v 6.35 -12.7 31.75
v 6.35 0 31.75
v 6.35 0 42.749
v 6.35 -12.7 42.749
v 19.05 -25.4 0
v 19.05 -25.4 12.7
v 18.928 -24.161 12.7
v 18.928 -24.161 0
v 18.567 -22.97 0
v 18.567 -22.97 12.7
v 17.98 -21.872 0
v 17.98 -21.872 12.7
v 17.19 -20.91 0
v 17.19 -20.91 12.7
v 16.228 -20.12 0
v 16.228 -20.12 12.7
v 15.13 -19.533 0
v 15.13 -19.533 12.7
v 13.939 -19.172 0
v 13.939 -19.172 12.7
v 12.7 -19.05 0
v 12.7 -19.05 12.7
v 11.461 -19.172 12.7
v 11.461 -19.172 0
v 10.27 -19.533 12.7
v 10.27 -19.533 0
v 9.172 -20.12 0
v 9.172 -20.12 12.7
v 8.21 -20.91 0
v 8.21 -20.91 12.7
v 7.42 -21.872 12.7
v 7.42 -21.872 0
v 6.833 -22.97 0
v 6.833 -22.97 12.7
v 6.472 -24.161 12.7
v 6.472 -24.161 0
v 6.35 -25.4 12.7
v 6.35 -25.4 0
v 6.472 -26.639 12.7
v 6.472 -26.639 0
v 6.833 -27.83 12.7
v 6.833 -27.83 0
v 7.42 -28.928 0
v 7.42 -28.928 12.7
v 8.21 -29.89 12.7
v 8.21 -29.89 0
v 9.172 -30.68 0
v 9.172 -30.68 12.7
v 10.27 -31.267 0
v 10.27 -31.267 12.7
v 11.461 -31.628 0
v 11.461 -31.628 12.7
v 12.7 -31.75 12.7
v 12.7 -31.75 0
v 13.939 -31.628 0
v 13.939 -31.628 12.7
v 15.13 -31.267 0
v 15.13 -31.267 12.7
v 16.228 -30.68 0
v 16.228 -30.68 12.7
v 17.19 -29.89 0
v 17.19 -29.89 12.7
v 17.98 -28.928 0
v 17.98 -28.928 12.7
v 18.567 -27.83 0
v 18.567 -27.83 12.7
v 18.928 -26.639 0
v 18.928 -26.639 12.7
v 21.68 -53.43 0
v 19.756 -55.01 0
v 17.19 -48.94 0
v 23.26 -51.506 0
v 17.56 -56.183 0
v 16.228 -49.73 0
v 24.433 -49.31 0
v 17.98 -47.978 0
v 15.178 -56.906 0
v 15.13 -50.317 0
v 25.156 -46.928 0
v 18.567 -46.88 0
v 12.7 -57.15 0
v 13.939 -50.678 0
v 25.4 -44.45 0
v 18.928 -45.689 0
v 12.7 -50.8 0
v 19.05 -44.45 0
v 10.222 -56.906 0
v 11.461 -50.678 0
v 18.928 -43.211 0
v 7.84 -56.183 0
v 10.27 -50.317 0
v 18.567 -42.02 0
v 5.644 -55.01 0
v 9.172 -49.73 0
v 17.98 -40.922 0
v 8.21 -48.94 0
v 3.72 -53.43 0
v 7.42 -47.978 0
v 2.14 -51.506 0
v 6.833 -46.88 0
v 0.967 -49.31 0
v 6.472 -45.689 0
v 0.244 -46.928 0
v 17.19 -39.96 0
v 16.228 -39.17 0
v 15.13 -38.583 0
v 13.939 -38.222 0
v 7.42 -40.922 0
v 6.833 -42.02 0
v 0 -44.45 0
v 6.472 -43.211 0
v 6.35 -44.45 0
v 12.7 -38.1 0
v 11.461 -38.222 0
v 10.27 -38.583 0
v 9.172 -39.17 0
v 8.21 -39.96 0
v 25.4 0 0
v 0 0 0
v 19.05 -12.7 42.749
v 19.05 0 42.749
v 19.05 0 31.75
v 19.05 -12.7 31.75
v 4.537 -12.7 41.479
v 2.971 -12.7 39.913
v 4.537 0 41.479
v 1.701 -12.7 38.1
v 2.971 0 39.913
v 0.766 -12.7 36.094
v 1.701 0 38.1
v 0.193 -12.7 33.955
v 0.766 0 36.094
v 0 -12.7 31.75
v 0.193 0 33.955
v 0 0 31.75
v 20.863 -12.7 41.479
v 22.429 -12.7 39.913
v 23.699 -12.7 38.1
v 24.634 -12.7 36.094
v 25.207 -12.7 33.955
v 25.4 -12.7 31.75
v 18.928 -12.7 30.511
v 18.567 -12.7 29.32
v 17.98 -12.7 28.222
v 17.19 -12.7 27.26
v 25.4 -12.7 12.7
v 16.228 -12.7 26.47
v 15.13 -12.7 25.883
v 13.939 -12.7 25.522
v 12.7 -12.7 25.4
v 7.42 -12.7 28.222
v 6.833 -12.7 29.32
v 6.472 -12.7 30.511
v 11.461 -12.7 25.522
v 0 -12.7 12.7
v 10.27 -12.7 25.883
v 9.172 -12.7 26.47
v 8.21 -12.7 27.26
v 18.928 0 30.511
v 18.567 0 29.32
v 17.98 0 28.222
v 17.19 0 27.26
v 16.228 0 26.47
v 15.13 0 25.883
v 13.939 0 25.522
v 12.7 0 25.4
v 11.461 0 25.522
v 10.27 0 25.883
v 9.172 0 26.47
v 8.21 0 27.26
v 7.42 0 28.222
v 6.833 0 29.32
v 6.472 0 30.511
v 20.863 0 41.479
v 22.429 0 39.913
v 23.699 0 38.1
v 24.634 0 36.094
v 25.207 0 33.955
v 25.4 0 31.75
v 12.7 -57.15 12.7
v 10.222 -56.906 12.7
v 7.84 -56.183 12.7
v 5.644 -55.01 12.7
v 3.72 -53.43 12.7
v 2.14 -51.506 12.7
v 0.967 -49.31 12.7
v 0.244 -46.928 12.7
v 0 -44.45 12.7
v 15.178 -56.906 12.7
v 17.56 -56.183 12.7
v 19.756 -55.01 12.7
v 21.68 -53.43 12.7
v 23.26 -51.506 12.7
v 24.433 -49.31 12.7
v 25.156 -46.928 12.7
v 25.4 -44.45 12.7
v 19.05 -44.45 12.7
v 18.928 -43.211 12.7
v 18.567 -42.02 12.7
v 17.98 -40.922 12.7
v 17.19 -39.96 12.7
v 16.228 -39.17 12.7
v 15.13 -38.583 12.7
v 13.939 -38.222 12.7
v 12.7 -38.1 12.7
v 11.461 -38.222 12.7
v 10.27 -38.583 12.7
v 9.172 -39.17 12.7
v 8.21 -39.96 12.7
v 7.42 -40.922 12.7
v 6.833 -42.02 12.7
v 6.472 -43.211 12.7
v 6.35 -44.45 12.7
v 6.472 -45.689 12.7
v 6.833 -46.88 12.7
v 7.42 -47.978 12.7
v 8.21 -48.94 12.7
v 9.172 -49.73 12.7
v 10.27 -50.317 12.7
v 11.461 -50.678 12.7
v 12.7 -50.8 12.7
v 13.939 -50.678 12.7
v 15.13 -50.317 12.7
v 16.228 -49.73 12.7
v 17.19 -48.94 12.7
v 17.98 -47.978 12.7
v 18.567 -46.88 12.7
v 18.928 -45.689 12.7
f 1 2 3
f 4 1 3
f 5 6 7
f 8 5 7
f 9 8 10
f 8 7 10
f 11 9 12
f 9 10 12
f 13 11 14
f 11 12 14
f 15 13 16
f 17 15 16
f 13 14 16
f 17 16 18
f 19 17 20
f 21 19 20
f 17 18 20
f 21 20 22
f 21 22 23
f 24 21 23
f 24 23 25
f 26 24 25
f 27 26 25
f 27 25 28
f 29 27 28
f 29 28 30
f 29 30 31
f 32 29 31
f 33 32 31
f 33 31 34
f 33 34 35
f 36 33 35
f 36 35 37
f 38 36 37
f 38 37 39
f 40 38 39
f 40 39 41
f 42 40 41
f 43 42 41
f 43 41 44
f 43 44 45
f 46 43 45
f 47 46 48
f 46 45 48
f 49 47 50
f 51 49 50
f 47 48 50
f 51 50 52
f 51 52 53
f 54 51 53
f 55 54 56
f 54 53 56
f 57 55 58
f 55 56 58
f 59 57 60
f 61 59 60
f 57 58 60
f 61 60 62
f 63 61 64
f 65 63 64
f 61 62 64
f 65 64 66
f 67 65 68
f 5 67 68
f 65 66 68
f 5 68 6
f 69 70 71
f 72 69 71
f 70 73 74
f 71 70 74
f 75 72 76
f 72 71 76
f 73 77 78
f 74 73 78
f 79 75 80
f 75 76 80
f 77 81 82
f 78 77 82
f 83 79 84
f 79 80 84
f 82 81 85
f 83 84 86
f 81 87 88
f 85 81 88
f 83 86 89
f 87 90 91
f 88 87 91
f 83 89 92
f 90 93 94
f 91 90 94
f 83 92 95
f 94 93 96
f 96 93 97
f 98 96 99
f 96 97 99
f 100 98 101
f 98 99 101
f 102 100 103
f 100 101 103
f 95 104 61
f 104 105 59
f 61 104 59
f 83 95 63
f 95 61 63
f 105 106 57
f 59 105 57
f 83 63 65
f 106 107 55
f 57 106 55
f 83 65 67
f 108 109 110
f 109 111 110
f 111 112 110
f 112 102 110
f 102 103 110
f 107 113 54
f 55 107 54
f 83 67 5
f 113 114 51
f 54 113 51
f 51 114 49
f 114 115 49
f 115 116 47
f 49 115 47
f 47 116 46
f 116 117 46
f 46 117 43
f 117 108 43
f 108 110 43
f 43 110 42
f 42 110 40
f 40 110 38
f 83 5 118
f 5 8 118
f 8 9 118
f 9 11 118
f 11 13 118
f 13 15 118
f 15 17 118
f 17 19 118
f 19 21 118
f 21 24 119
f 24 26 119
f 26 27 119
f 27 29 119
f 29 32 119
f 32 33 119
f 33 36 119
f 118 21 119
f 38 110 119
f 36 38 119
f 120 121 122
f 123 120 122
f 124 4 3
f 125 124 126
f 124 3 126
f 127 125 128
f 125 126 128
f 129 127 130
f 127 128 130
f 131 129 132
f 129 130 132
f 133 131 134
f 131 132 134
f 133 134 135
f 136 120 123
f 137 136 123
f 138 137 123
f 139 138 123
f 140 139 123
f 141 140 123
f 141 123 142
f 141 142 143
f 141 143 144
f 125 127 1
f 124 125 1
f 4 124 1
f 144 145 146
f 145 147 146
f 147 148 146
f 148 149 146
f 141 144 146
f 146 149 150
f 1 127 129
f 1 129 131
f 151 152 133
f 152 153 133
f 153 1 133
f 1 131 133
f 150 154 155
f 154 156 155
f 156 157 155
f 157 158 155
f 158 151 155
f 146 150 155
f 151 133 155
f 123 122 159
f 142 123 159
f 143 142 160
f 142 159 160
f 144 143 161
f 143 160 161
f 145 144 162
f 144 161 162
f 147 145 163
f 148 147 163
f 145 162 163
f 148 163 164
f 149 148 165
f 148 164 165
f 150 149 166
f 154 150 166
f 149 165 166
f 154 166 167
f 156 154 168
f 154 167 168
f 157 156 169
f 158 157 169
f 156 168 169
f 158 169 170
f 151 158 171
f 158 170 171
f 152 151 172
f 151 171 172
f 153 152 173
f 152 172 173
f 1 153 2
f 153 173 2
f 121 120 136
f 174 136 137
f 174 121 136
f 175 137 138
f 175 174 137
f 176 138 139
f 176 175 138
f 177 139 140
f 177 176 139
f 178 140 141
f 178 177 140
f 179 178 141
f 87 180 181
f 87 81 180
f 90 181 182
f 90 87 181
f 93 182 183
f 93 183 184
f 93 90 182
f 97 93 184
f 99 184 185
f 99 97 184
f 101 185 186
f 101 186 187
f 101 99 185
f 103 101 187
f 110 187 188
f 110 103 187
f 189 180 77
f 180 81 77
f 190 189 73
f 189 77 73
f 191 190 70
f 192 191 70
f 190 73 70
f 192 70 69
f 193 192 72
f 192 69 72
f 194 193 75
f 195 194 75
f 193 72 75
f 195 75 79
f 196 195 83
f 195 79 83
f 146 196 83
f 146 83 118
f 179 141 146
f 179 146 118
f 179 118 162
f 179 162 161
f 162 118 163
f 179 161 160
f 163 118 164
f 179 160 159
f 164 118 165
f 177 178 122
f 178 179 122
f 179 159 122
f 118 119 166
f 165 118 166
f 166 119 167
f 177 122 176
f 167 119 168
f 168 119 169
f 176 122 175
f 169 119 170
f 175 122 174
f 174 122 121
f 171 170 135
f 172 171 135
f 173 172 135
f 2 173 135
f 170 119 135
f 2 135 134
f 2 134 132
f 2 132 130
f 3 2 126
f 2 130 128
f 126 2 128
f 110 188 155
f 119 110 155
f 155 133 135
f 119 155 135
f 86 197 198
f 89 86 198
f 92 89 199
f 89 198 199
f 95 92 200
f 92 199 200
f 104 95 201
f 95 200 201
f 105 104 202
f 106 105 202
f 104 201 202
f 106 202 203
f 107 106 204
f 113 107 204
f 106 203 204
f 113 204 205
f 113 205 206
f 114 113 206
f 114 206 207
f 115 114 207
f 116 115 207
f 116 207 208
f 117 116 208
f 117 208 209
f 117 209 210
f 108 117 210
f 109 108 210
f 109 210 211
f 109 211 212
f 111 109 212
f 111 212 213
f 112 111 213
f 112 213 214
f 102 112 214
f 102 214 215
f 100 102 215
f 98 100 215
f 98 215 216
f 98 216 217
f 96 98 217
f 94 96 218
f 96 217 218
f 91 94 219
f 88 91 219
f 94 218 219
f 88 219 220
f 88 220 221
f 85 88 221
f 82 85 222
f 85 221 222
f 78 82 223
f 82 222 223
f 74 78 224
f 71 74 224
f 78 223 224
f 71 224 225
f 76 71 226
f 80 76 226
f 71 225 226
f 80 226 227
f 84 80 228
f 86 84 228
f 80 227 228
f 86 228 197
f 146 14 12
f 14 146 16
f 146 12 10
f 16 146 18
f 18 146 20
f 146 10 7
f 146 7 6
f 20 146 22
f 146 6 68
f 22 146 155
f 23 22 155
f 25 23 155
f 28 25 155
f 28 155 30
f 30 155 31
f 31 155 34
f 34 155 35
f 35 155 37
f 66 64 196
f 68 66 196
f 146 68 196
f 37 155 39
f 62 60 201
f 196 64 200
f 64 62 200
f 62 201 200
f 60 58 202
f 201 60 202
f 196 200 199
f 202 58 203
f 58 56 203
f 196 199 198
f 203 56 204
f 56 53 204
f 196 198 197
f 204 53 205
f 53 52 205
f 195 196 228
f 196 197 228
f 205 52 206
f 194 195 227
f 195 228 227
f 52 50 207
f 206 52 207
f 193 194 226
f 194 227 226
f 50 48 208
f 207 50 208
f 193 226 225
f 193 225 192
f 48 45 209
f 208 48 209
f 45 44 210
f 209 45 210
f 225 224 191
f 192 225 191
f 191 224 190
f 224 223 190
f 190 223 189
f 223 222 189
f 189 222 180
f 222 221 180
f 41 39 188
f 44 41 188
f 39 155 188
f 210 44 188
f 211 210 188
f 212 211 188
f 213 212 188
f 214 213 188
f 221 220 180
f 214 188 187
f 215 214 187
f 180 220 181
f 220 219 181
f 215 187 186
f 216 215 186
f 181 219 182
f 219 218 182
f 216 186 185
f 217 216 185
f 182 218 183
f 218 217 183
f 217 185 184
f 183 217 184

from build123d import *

# Parameters (mm, degrees)
F1_DEPTH    = 25.4
F2_T1_DEPTH = 76.2
F3_R        = 12.69999
F6_DEPTH    = 25.4
F4_R        = 6.35
F7_DEPTH    = 25.4


# Not quite as in the source:
# - a fillet or chamfer that OpenCascade refuses, or shapes differently, is made with other operations: its cross-section is extruded or revolved along the edge and cut away or added
# - a fillet or chamfer is up to 0.001 mm smaller than in the source, because OpenCascade refuses the exact size


with BuildPart() as f1:
    # F0 (on Right) → F1 (new body)
    with BuildSketch(Plane.YZ):
        Polygon((-57.15, 0), (0, 0), (0, 44.45), (-12.7, 44.45), (-12.7, 12.7), (-57.15, 12.7), align=None)
    extrude(amount=F1_DEPTH)

    # F2: fillet of radius 12.7 on 2 edges, made by hand

    # F2_s2 → F2_t1 (cut)
    with BuildSketch(Plane.XZ.offset(-31.75)):
        with BuildLine():
            ThreePointArc((12.7, 44.45), (3.7197438789, 40.7302561211), (0, 31.75))
            Line((0, 31.75), (0, 44.45))
            Line((0, 44.45), (12.7, 44.45))
        make_face()
        with BuildLine():
            ThreePointArc((12.7, 44.45), (21.6802561211, 40.7302561211), (25.4, 31.75))
            Line((25.4, 31.75), (25.4, 44.45))
            Line((25.4, 44.45), (12.7, 44.45))
        make_face()
    extrude(amount=F2_T1_DEPTH, mode=Mode.SUBTRACT)

    # F3 (radius 12.7 in the source; OpenCascade refuses exactly that, so slightly less here)
    f3_edges = [f1.edges().sort_by_distance(p)[0] for p in [
        (25.4, -57.15, 6.35),
        (0, -57.15, 6.35),
    ]]
    fillet(f3_edges, radius=F3_R)

    # F5 (on face) → F6 (cut)
    with BuildSketch(Plane(origin=(0, 0, 0), x_dir=(-1, 0, 0), z_dir=(0, 1, 0))):
        with BuildLine():
            ThreePointArc((-19.05, 31.75), (-12.7, 25.4), (-6.35, 31.75))
            ThreePointArc((-6.35, 31.75), (-12.7, 38.1), (-19.05, 31.75))
        make_face()
        with BuildLine():
            ThreePointArc((-19.05, 31.75), (-12.7, 38.1), (-6.35, 31.75))
            Line((-6.35, 31.75), (-6.35, 42.7485226281))
            ThreePointArc((-6.35, 42.7485226281), (-9.4129981272, 44.0172579939), (-12.7, 44.45))
            ThreePointArc((-12.7, 44.45), (-15.9870018728, 44.0172579939), (-19.05, 42.7485226281))
            Line((-19.05, 42.7485226281), (-19.05, 31.75))
        make_face()
    extrude(amount=-F6_DEPTH, mode=Mode.SUBTRACT)

    # F4 (on face) → F7 (cut)
    with BuildSketch(Plane.XY.offset(12.7)):
        with Locations((12.7, -44.45)):
            Circle(F4_R)
        with Locations((12.7, -25.4)):
            Circle(F4_R)
    extrude(amount=-F7_DEPTH, mode=Mode.SUBTRACT)


solid = f1.part
